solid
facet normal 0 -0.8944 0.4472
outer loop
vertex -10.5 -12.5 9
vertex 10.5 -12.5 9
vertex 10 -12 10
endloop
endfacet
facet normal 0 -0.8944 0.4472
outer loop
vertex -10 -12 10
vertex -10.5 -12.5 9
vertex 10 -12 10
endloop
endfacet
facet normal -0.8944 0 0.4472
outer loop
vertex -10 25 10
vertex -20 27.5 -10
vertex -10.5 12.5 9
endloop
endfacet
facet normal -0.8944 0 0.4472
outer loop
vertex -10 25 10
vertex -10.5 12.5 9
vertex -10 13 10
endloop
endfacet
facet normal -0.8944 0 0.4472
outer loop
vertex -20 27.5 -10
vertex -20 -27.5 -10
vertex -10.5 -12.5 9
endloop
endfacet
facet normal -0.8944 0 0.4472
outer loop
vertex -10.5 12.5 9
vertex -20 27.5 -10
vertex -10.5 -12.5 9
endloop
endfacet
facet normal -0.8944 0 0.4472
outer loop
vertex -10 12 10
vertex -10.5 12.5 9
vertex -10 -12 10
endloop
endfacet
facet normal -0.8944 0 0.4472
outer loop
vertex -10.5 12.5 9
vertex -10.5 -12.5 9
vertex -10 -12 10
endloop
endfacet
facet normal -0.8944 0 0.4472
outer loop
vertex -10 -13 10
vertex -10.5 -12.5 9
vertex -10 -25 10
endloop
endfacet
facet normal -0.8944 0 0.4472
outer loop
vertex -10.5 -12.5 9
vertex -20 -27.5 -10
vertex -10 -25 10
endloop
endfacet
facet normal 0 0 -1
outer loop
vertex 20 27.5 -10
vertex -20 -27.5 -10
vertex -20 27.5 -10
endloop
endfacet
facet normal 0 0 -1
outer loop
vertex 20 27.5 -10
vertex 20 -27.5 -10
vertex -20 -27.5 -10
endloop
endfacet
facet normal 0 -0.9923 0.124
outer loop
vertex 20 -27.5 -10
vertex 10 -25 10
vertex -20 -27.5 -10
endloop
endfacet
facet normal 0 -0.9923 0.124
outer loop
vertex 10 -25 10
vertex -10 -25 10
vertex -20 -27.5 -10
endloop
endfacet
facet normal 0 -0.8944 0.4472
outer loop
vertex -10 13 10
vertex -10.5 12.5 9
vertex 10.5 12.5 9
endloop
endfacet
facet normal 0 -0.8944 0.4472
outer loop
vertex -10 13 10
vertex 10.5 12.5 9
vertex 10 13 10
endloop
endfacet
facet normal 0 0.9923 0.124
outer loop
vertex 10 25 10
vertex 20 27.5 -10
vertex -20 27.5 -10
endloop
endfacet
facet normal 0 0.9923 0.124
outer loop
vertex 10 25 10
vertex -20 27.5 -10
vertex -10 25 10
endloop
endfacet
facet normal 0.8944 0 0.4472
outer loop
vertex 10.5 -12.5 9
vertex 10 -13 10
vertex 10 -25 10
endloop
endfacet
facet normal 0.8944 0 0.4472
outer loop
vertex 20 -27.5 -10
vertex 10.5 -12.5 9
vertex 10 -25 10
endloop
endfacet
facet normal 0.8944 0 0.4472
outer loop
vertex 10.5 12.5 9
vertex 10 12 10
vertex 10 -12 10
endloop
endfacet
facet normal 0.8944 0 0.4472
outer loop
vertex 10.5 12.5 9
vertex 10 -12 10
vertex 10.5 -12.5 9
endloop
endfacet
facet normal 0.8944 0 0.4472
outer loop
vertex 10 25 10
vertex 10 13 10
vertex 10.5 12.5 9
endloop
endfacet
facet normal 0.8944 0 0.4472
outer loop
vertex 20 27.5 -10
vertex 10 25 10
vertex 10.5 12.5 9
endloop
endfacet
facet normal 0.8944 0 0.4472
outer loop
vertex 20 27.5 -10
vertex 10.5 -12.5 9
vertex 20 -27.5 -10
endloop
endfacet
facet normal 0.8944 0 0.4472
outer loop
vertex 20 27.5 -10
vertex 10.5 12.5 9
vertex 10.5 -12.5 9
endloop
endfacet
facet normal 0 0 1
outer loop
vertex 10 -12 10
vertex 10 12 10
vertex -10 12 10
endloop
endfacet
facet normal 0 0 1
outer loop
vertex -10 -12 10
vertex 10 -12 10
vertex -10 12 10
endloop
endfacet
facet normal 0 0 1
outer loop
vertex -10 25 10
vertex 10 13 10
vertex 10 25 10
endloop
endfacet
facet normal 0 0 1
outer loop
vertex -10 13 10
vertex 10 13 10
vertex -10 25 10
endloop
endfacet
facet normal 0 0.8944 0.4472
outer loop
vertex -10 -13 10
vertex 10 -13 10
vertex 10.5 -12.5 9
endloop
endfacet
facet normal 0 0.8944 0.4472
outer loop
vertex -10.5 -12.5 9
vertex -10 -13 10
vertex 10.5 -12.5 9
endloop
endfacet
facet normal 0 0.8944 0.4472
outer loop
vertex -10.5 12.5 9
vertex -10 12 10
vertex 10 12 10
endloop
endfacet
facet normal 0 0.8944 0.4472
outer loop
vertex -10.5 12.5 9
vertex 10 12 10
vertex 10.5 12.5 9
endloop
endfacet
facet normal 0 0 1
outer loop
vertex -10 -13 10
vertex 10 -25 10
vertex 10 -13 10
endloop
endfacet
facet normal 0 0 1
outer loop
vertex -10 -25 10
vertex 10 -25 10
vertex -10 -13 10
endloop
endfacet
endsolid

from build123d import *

# Parameters (mm, degrees)
F0_W     = 20
F0_H     = 20
F1_DEPTH = 25
F3_DEPTH = 20
F4_DEPTH = 30
F5_DEPTH = 25


with BuildPart() as f1:
    # F0 (on Front) → F1 (new body, symmetric)
    with BuildSketch(Plane.XZ):
        Rectangle(F0_W, F0_H)
        Polygon((20, -10), (10, 10), (10, -10), align=None)
        Polygon((20, 10), (10, 10), (20, -10), align=None)
        Polygon((-10, -10), (-10, 10), (-20, -10), align=None)
        Polygon((-20, -10), (-10, 10), (-20, 10), align=None)
    extrude(amount=F1_DEPTH, both=True)

    # F2 (on Right) → F3 (join, symmetric)
    with BuildSketch(Plane.YZ):
        Polygon((-25, -10), (-25, 0), (-25, 10), (-27.5, -10), align=None)
        Polygon((25, 10), (25, 0), (25, -10), (27.5, -10), align=None)
    extrude(amount=F3_DEPTH, both=True)

    # F0 (on Front) → F4 (cut, symmetric)
    with BuildSketch(Plane.XZ):
        Polygon((20, 10), (10, 10), (20, -10), align=None)
        Polygon((-20, -10), (-10, 10), (-20, 10), align=None)
    extrude(amount=F4_DEPTH, both=True, mode=Mode.SUBTRACT)

    # F2 (on Right) → F5 (cut, symmetric)
    with BuildSketch(Plane.YZ):
        Polygon((12.5, 9), (12.5, 10), (12, 10), align=None)
        Polygon((12.5, 9), (13, 10), (12.5, 10), align=None)
        Polygon((-12.5, 10), (-13, 10), (-12.5, 9), align=None)
        Polygon((-12, 10), (-12.5, 10), (-12.5, 9), align=None)
    extrude(amount=F5_DEPTH, both=True, mode=Mode.SUBTRACT)


solid = f1.part
